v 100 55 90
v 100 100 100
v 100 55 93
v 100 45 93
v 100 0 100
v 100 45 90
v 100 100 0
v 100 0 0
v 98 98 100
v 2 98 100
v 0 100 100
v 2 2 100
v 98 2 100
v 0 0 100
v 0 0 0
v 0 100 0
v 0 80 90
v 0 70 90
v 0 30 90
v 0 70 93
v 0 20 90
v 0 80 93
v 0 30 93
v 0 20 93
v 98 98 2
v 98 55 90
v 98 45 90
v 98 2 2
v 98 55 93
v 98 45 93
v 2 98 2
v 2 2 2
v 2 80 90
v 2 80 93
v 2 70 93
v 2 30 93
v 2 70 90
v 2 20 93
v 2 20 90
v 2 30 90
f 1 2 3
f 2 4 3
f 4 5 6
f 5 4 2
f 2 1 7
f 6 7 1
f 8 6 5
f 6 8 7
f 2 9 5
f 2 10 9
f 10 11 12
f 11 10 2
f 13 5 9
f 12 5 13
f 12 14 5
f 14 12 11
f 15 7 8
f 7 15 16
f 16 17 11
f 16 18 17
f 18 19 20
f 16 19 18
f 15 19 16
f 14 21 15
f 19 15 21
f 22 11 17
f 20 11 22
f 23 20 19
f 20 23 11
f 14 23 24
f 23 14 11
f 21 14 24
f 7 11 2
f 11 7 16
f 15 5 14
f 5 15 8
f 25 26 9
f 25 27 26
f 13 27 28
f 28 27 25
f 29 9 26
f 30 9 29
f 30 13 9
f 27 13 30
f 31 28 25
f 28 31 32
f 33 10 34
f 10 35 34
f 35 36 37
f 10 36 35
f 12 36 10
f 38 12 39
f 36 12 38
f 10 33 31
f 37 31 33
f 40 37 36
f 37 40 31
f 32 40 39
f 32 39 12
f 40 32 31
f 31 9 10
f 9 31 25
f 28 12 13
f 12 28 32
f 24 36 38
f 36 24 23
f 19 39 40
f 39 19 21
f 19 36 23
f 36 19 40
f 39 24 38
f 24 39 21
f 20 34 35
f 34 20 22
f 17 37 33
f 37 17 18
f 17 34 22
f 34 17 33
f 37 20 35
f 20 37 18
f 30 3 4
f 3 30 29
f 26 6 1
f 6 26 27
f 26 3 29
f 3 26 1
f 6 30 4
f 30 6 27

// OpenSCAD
$fn=250;

difference()
{
// Basic cube
translate([0,0,0]) cube([100,100,100]);
// Hollow it
translate([2,2,2]) cube([96,96,100]);
// lid lock hole
translate([-20,20,90]) cube([60,10,3]);
translate([-20,70,90]) cube([60,10,3]);
translate([70,45,90]) cube([60,10,3]);
}
